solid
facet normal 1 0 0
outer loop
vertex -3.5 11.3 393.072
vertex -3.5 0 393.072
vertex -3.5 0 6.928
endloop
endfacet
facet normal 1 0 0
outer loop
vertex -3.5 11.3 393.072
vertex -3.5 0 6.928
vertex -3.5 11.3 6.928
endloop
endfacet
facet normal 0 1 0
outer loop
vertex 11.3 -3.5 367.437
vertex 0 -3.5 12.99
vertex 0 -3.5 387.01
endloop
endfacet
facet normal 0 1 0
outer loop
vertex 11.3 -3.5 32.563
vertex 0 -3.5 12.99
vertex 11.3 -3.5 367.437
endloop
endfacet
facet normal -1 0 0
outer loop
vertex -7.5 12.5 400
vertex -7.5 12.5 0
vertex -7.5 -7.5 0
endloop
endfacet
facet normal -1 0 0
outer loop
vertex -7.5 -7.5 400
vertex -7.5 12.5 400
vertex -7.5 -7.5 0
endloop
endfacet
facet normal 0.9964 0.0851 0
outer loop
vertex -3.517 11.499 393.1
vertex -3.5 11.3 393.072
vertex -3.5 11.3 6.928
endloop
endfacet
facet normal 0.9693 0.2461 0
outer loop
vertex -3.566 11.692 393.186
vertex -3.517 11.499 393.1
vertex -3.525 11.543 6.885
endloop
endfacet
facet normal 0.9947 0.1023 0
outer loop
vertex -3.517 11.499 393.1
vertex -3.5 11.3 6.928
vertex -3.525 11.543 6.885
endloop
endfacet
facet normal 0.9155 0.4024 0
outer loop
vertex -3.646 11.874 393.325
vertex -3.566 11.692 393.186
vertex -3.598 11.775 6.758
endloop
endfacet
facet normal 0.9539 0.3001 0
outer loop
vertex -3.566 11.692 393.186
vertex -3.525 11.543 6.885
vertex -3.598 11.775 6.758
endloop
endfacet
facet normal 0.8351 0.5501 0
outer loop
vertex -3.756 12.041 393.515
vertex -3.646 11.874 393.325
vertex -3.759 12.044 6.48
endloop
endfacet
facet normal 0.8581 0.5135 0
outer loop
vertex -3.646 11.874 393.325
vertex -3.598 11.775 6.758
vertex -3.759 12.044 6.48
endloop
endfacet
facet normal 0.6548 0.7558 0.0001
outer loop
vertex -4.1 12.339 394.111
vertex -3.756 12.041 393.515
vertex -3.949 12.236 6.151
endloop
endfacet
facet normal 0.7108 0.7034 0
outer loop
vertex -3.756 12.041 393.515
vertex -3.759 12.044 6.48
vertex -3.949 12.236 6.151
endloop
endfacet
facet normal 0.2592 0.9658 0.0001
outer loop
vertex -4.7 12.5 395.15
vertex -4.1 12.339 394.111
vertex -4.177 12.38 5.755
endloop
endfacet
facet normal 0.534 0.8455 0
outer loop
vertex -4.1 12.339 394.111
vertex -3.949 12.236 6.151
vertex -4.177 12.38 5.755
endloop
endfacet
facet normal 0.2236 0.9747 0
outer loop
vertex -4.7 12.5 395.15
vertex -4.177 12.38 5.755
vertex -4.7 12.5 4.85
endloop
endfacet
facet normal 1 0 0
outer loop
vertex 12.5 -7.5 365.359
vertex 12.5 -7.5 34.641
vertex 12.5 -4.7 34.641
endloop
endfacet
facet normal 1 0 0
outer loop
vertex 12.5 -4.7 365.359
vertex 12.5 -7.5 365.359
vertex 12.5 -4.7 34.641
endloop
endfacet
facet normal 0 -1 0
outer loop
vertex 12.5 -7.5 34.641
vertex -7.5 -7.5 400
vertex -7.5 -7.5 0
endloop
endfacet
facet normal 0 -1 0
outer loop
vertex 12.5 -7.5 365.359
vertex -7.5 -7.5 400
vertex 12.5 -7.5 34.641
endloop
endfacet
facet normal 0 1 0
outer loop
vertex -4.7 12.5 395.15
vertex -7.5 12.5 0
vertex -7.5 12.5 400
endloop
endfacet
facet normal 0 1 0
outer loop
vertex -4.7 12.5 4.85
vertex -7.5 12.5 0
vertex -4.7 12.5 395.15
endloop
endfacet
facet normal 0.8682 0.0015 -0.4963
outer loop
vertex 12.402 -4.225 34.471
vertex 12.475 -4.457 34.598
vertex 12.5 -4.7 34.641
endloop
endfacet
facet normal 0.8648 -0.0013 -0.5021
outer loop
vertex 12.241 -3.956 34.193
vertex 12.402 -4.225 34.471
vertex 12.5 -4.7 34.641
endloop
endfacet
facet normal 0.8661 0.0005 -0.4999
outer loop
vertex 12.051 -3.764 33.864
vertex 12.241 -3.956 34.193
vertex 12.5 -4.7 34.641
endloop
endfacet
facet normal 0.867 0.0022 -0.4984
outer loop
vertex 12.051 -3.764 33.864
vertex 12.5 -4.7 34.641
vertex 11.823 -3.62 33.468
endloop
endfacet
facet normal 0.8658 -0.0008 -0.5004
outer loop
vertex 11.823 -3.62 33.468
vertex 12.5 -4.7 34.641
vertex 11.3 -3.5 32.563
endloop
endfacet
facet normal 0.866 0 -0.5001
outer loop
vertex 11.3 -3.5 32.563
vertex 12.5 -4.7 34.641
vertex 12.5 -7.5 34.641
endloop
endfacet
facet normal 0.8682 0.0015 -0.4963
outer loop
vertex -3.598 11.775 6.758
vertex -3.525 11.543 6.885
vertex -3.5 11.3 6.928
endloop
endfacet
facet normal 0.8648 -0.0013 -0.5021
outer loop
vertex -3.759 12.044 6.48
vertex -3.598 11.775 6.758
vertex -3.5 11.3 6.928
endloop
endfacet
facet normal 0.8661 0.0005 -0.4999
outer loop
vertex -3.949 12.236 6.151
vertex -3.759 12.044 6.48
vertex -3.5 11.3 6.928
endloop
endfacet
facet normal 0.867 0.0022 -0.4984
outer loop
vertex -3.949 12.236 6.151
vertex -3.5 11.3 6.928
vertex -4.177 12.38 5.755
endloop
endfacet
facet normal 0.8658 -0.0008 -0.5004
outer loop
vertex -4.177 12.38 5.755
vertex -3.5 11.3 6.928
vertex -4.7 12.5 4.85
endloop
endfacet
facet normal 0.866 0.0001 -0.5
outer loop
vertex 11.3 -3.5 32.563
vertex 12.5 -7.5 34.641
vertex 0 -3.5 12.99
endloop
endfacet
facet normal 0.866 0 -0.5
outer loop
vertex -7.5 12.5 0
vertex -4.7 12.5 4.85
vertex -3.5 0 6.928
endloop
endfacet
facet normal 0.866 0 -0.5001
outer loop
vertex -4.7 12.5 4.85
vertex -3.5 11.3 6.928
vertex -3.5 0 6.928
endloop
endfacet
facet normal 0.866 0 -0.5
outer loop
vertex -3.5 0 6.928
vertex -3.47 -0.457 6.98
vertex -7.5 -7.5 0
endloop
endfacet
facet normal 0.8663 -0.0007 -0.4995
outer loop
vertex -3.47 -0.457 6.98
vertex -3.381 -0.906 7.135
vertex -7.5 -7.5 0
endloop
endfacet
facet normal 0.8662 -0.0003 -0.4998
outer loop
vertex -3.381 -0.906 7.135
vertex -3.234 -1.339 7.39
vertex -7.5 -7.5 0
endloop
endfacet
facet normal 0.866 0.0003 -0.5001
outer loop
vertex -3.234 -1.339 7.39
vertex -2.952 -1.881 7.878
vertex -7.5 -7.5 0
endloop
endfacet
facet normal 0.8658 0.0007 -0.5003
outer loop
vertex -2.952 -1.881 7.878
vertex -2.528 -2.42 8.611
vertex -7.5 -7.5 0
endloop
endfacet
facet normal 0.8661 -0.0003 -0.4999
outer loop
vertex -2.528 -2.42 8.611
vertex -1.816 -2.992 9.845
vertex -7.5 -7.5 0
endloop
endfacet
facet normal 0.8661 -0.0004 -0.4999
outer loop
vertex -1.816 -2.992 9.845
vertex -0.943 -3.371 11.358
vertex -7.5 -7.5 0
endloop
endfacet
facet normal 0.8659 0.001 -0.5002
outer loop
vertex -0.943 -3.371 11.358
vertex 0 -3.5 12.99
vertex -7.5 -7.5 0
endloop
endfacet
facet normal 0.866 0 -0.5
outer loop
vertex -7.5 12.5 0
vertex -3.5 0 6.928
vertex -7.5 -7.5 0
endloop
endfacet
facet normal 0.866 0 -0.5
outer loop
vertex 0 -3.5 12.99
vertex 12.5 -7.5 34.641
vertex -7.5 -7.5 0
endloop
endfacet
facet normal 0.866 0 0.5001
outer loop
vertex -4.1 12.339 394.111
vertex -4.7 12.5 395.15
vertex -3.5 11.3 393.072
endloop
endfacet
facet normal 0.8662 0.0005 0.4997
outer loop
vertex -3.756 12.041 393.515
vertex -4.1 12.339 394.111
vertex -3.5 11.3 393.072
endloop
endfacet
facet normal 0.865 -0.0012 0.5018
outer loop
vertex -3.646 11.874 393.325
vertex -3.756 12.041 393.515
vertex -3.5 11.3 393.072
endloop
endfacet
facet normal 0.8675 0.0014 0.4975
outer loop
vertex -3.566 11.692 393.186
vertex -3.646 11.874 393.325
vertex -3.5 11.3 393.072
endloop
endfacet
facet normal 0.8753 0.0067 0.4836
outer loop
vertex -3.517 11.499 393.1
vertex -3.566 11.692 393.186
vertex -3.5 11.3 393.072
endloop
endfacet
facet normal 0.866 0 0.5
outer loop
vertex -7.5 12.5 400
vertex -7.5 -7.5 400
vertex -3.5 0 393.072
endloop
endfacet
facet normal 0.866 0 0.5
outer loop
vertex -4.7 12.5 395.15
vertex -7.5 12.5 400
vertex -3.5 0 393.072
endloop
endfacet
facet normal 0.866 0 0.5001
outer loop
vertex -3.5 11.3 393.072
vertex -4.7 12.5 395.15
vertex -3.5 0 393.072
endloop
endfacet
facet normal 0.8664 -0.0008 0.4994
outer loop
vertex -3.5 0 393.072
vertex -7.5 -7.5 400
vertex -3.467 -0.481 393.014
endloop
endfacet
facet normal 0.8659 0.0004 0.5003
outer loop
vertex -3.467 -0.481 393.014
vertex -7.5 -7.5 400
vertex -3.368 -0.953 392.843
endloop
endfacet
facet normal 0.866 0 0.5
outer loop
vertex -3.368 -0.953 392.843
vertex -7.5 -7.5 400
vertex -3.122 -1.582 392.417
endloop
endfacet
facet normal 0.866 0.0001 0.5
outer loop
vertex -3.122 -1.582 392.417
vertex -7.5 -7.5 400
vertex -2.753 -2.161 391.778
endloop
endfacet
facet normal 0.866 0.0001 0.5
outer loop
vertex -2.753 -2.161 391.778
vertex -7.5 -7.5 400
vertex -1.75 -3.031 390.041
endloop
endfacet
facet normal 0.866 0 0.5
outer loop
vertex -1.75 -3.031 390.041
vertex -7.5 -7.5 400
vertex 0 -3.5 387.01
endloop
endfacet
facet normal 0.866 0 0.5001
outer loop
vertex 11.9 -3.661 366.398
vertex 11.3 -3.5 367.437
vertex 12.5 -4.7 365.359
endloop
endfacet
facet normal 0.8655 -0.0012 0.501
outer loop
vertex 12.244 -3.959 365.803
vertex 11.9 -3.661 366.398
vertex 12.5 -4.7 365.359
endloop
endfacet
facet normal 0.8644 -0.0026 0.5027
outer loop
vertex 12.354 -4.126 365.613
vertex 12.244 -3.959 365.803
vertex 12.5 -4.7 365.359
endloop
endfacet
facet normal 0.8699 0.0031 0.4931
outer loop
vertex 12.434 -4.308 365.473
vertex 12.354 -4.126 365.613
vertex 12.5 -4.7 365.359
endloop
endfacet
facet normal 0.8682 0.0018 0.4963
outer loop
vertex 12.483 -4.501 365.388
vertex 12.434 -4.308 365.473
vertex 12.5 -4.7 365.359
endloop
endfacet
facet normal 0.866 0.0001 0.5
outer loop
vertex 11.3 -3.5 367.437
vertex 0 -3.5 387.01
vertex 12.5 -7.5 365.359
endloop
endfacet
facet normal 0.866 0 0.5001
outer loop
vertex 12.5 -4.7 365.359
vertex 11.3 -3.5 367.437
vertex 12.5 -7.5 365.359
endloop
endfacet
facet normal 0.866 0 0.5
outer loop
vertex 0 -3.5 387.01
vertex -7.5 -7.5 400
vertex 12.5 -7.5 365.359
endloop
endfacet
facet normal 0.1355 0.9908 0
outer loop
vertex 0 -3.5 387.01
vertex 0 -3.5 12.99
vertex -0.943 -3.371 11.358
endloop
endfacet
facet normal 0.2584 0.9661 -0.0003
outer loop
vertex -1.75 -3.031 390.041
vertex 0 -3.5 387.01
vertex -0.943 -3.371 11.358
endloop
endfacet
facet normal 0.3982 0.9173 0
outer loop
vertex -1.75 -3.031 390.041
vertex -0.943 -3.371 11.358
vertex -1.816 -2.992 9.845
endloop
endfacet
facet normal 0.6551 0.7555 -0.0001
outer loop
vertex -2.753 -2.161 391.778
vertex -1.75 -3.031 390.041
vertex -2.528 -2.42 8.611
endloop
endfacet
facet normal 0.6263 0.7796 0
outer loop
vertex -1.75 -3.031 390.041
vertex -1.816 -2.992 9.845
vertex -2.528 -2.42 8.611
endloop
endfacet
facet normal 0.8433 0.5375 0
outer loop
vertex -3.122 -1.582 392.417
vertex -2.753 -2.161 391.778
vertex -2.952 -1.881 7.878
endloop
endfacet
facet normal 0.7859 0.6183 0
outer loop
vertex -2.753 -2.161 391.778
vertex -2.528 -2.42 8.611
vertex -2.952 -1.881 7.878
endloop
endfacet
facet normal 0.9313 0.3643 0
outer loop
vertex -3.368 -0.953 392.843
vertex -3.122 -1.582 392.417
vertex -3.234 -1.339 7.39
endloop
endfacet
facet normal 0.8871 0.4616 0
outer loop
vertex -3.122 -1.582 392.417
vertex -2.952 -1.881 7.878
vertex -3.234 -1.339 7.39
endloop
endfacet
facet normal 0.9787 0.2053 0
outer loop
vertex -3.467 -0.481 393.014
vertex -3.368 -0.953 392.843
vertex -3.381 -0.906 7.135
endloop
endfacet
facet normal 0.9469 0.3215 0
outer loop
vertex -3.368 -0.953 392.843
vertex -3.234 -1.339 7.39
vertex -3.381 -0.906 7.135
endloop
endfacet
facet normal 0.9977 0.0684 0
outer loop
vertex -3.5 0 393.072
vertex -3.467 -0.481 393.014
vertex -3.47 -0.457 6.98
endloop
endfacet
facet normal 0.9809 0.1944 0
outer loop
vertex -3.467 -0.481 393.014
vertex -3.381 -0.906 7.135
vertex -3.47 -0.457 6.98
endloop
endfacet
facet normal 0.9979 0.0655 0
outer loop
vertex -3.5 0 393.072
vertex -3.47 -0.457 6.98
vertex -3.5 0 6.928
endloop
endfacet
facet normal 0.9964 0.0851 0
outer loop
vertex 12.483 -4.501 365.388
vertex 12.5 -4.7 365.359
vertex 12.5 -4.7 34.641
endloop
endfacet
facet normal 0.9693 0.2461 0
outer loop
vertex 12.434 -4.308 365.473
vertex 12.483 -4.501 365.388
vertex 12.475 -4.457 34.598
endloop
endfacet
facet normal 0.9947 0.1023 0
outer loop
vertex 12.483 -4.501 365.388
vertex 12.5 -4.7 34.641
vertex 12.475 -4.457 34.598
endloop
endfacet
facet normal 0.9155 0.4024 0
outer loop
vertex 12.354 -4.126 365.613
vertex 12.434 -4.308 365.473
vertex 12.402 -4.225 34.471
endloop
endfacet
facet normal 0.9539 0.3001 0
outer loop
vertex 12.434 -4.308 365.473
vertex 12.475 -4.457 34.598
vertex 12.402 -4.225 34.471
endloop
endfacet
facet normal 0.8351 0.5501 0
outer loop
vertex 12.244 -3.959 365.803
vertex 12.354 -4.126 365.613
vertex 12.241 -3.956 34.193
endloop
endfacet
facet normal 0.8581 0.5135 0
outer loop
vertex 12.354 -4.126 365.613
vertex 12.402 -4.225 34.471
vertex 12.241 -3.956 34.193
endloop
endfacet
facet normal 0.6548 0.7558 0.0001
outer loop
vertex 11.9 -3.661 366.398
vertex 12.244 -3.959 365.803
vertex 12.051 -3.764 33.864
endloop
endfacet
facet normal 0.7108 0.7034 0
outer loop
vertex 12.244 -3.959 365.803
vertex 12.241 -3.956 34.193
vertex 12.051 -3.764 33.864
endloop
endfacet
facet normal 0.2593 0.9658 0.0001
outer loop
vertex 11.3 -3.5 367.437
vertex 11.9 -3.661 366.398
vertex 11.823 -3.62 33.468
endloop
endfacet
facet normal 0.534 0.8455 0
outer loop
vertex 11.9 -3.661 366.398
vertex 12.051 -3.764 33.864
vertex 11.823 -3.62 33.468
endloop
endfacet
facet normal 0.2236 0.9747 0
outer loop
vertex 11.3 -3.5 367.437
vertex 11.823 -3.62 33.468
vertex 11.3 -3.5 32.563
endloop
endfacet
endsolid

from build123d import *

# Parameters (mm, degrees)
EXTRUDE_1_DEPTH     = 400
CUT_EXTRUDE_1_DEPTH = 21
CUT_EXTRUDE_2_DEPTH = 21


with BuildPart() as part:
    # Эскиз1 → Бобышка-Вытянуть1 (new body)
    with BuildSketch(Plane.XY):
        with BuildLine():
            Line((-7.5, 12.5), (-7.5, -7.5))
            Line((-7.5, -7.5), (12.5, -7.5))
            Line((12.5, -7.5), (12.5, -4.7))
            ThreePointArc((12.5, -4.7), (12.148528137, -3.851471863), (11.3, -3.5))
            Line((11.3, -3.5), (0, -3.5))
            ThreePointArc((0, -3.5), (-2.474873734, -2.474873734), (-3.5, 0))
            Line((-3.5, 0), (-3.5, 11.3))
            ThreePointArc((-3.5, 11.3), (-3.851471863, 12.148528137), (-4.7, 12.5))
            Line((-4.7, 12.5), (-7.5, 12.5))
        make_face()
    extrude(amount=EXTRUDE_1_DEPTH)

    # Эскиз4 → Вырез-Вытянуть1 (cut, through all)
    with BuildSketch(Plane.XZ.offset(7.5)):
        Polygon((-7.5, 0), (12.5, 0), (12.5, 34.641016151), align=None)
    extrude(amount=-CUT_EXTRUDE_1_DEPTH, mode=Mode.SUBTRACT)

    # Эскиз5 → Вырез-Вытянуть2 (cut, through all)
    with BuildSketch(Plane.XZ.offset(7.5)):
        Polygon((12.5, 400), (-7.5, 400), (12.5, 365.358983849), align=None)
    extrude(amount=-CUT_EXTRUDE_2_DEPTH, mode=Mode.SUBTRACT)


solid = part.part
